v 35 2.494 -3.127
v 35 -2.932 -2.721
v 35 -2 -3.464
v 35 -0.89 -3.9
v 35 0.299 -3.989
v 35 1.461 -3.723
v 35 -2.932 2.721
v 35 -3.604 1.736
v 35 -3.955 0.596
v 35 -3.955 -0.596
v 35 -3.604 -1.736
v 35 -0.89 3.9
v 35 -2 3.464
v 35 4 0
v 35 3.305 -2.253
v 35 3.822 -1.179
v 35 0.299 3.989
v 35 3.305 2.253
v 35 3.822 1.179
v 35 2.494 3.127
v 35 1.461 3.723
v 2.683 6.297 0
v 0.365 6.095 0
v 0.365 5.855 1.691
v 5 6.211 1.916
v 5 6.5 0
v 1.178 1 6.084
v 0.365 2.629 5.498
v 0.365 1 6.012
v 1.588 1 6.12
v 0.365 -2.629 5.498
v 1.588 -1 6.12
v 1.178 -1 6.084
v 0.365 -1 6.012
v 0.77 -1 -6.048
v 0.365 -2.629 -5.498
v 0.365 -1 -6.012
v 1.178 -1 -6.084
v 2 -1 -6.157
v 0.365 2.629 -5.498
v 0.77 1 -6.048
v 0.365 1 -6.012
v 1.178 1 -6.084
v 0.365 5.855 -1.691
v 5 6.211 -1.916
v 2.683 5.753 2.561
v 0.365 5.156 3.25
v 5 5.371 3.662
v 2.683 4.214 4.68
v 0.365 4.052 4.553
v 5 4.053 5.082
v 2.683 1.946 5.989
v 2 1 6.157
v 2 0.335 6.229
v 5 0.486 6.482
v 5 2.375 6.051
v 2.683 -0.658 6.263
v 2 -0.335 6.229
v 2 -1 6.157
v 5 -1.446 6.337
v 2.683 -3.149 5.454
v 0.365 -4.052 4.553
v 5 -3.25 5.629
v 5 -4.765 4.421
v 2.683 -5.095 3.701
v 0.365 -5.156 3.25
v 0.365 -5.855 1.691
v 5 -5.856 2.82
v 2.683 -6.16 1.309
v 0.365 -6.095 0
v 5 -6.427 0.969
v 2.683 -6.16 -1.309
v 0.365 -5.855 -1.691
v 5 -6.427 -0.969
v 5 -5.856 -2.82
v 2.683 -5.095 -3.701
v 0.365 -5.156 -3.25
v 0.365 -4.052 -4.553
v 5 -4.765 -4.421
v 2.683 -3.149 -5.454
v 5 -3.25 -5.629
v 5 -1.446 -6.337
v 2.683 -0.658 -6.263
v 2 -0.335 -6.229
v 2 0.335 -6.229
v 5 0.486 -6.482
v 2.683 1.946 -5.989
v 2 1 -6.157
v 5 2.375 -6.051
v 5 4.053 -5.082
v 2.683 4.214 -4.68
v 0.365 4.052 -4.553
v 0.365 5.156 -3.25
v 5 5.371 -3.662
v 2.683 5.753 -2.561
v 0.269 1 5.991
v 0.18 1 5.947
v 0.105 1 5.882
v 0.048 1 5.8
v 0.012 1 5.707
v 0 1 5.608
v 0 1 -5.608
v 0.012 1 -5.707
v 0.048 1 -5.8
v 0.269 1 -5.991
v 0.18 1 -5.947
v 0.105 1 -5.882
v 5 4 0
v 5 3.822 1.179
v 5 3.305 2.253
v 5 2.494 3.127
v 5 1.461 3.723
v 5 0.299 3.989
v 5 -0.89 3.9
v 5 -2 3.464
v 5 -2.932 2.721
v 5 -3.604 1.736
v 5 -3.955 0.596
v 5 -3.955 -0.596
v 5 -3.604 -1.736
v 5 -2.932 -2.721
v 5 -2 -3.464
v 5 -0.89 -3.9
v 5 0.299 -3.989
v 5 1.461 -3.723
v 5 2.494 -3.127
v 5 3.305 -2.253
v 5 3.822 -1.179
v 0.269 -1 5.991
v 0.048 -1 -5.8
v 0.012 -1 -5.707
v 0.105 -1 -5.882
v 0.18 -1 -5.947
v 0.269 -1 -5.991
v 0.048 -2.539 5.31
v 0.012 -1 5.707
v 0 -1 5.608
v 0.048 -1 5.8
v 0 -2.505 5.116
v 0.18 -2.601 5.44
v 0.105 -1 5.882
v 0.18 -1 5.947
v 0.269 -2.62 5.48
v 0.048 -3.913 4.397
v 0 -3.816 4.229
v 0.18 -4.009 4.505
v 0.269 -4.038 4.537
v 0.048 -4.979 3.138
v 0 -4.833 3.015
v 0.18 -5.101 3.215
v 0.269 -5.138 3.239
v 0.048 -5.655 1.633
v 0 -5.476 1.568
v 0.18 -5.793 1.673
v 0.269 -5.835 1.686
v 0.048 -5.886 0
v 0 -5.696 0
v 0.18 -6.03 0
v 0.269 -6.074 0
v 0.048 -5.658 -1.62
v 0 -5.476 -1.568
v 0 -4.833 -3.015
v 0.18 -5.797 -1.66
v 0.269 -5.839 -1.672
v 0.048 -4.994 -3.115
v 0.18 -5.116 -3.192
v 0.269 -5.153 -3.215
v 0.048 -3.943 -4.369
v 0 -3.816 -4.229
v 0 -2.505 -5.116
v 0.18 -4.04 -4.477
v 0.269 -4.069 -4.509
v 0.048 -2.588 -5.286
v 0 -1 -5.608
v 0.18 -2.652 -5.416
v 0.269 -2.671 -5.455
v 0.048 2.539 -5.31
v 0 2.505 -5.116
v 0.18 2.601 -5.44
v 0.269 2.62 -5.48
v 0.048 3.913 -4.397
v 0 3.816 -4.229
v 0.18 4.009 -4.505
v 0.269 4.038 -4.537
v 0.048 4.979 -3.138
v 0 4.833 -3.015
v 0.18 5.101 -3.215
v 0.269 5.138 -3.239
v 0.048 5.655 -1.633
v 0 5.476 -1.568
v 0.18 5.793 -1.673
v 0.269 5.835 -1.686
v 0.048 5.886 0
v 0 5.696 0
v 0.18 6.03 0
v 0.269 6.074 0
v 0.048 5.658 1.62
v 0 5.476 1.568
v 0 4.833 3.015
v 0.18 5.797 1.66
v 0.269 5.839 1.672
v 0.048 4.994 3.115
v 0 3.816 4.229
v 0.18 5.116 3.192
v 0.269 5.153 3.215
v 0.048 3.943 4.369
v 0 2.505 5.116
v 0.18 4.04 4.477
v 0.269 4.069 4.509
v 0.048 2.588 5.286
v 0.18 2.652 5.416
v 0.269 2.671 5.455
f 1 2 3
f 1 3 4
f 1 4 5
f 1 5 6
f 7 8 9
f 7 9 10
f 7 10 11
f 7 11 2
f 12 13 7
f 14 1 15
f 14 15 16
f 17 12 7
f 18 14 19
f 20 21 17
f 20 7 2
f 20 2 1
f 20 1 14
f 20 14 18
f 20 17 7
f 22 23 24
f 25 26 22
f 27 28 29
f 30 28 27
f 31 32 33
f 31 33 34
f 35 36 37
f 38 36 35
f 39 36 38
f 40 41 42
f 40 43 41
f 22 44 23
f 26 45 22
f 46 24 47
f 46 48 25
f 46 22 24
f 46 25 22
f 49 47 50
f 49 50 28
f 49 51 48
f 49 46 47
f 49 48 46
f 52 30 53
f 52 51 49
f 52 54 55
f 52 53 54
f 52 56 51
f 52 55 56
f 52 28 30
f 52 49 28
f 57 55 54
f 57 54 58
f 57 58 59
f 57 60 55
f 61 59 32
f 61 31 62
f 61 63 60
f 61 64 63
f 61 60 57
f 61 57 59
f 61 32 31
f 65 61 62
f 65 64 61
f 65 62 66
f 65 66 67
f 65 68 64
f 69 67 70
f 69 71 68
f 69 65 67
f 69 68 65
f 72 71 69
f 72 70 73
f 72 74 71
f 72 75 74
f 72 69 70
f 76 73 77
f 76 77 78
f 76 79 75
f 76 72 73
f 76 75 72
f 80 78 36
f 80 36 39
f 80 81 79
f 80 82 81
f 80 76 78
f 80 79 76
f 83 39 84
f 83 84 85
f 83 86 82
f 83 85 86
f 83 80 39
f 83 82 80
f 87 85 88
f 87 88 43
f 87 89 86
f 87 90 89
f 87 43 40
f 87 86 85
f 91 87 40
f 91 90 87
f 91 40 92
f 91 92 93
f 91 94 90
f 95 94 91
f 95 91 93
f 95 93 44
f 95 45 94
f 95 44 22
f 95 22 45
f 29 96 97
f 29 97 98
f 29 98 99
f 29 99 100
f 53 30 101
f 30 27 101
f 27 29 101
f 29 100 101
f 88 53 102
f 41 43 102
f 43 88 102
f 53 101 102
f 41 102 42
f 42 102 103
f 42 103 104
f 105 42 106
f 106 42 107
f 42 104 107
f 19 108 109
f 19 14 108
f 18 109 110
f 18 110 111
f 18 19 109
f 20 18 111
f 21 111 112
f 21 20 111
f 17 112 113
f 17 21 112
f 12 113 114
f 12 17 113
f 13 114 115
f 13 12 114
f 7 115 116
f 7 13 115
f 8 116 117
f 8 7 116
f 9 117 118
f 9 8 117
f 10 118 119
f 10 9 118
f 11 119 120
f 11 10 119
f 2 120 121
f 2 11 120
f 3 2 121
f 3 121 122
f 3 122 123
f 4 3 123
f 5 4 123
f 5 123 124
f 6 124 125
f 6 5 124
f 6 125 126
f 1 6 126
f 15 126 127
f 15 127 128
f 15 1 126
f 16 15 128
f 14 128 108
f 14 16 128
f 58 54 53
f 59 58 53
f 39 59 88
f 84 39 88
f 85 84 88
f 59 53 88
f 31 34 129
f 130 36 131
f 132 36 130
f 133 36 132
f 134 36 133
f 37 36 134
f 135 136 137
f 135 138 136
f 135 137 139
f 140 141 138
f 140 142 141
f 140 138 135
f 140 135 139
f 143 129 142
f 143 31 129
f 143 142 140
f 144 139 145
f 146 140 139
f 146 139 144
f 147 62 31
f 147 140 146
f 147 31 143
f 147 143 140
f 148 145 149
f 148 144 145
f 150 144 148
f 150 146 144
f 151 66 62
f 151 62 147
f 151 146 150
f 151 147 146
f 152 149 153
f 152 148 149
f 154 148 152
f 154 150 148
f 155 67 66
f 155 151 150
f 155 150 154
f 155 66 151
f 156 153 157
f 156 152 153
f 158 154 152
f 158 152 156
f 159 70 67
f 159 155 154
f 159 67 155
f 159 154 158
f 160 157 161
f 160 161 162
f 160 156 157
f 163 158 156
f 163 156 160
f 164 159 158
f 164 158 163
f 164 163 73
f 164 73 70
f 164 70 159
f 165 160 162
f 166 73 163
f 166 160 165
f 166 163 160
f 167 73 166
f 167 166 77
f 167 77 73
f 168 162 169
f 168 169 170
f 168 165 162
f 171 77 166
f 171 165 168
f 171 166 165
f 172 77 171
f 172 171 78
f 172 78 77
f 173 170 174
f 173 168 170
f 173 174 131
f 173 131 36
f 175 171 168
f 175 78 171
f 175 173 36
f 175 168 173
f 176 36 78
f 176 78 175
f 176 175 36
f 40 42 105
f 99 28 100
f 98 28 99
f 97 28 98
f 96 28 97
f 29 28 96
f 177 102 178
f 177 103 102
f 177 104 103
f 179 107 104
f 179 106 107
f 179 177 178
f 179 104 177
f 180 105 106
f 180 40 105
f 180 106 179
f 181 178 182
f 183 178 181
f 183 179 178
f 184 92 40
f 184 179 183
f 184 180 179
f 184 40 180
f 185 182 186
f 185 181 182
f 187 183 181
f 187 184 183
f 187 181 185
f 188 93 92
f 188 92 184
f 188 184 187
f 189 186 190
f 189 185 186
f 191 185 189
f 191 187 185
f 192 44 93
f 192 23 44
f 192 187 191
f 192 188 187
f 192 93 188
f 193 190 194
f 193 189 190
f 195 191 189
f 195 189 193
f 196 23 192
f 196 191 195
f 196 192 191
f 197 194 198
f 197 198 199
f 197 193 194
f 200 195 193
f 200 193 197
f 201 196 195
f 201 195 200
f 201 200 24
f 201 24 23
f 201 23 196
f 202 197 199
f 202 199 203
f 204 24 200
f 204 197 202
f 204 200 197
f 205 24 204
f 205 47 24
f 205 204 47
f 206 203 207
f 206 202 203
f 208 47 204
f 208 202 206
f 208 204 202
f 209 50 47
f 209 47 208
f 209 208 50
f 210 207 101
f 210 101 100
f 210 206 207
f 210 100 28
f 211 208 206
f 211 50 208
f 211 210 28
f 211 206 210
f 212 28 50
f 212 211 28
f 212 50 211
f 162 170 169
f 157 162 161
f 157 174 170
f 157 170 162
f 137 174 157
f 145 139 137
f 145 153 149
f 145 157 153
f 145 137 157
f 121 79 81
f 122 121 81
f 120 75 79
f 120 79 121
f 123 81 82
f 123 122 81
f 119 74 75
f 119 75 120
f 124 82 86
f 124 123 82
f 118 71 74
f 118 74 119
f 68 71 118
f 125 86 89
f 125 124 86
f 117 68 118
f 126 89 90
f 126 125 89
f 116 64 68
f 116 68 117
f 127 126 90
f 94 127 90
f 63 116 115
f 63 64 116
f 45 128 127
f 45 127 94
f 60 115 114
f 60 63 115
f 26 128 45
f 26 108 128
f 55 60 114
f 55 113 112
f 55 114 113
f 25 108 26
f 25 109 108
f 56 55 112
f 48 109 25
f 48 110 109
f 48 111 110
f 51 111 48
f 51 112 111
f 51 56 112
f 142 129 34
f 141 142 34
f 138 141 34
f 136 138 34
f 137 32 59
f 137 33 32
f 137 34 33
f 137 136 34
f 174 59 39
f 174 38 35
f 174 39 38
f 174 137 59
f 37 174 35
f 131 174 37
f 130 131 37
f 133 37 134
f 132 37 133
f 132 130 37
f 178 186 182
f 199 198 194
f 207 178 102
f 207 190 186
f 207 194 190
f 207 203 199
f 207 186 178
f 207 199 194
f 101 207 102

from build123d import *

# Parameters (mm, degrees)
SKETCH2_W  = 13
SKETCH2_H  = 2
SLOT_DEPTH = 2


with BuildPart() as part:
    # Fillet2: read off the stored shape, not the designer's step
    # Fillet2 outline → Fillet2 (revolve)
    with BuildSketch(Plane.YX):
        with BuildLine():
            Line((4, 5), (4, 35))
            Line((4, 35), (0, 35))
            Line((0, 35), (0, 0))
            Line((0, 0), (5.696024213, 0))
            ThreePointArc((5.696024213, 0), (5.966260296, 0.105089065), (6.094502092, 0.365137703))
            Line((6.094502092, 0.365137703), (6.5, 5))
            Line((6.5, 5), (4, 5))
        make_face()
    revolve(axis=Axis((0, 0, 0), (1, 0, 0)))

    # Sketch2 → Slot (cut)
    with BuildSketch(Plane(origin=(0, 0, 0), x_dir=(0, 0, -1), z_dir=(1, 0, 0))):
        Rectangle(SKETCH2_W, SKETCH2_H)
    extrude(amount=SLOT_DEPTH, mode=Mode.SUBTRACT)


solid = part.part
